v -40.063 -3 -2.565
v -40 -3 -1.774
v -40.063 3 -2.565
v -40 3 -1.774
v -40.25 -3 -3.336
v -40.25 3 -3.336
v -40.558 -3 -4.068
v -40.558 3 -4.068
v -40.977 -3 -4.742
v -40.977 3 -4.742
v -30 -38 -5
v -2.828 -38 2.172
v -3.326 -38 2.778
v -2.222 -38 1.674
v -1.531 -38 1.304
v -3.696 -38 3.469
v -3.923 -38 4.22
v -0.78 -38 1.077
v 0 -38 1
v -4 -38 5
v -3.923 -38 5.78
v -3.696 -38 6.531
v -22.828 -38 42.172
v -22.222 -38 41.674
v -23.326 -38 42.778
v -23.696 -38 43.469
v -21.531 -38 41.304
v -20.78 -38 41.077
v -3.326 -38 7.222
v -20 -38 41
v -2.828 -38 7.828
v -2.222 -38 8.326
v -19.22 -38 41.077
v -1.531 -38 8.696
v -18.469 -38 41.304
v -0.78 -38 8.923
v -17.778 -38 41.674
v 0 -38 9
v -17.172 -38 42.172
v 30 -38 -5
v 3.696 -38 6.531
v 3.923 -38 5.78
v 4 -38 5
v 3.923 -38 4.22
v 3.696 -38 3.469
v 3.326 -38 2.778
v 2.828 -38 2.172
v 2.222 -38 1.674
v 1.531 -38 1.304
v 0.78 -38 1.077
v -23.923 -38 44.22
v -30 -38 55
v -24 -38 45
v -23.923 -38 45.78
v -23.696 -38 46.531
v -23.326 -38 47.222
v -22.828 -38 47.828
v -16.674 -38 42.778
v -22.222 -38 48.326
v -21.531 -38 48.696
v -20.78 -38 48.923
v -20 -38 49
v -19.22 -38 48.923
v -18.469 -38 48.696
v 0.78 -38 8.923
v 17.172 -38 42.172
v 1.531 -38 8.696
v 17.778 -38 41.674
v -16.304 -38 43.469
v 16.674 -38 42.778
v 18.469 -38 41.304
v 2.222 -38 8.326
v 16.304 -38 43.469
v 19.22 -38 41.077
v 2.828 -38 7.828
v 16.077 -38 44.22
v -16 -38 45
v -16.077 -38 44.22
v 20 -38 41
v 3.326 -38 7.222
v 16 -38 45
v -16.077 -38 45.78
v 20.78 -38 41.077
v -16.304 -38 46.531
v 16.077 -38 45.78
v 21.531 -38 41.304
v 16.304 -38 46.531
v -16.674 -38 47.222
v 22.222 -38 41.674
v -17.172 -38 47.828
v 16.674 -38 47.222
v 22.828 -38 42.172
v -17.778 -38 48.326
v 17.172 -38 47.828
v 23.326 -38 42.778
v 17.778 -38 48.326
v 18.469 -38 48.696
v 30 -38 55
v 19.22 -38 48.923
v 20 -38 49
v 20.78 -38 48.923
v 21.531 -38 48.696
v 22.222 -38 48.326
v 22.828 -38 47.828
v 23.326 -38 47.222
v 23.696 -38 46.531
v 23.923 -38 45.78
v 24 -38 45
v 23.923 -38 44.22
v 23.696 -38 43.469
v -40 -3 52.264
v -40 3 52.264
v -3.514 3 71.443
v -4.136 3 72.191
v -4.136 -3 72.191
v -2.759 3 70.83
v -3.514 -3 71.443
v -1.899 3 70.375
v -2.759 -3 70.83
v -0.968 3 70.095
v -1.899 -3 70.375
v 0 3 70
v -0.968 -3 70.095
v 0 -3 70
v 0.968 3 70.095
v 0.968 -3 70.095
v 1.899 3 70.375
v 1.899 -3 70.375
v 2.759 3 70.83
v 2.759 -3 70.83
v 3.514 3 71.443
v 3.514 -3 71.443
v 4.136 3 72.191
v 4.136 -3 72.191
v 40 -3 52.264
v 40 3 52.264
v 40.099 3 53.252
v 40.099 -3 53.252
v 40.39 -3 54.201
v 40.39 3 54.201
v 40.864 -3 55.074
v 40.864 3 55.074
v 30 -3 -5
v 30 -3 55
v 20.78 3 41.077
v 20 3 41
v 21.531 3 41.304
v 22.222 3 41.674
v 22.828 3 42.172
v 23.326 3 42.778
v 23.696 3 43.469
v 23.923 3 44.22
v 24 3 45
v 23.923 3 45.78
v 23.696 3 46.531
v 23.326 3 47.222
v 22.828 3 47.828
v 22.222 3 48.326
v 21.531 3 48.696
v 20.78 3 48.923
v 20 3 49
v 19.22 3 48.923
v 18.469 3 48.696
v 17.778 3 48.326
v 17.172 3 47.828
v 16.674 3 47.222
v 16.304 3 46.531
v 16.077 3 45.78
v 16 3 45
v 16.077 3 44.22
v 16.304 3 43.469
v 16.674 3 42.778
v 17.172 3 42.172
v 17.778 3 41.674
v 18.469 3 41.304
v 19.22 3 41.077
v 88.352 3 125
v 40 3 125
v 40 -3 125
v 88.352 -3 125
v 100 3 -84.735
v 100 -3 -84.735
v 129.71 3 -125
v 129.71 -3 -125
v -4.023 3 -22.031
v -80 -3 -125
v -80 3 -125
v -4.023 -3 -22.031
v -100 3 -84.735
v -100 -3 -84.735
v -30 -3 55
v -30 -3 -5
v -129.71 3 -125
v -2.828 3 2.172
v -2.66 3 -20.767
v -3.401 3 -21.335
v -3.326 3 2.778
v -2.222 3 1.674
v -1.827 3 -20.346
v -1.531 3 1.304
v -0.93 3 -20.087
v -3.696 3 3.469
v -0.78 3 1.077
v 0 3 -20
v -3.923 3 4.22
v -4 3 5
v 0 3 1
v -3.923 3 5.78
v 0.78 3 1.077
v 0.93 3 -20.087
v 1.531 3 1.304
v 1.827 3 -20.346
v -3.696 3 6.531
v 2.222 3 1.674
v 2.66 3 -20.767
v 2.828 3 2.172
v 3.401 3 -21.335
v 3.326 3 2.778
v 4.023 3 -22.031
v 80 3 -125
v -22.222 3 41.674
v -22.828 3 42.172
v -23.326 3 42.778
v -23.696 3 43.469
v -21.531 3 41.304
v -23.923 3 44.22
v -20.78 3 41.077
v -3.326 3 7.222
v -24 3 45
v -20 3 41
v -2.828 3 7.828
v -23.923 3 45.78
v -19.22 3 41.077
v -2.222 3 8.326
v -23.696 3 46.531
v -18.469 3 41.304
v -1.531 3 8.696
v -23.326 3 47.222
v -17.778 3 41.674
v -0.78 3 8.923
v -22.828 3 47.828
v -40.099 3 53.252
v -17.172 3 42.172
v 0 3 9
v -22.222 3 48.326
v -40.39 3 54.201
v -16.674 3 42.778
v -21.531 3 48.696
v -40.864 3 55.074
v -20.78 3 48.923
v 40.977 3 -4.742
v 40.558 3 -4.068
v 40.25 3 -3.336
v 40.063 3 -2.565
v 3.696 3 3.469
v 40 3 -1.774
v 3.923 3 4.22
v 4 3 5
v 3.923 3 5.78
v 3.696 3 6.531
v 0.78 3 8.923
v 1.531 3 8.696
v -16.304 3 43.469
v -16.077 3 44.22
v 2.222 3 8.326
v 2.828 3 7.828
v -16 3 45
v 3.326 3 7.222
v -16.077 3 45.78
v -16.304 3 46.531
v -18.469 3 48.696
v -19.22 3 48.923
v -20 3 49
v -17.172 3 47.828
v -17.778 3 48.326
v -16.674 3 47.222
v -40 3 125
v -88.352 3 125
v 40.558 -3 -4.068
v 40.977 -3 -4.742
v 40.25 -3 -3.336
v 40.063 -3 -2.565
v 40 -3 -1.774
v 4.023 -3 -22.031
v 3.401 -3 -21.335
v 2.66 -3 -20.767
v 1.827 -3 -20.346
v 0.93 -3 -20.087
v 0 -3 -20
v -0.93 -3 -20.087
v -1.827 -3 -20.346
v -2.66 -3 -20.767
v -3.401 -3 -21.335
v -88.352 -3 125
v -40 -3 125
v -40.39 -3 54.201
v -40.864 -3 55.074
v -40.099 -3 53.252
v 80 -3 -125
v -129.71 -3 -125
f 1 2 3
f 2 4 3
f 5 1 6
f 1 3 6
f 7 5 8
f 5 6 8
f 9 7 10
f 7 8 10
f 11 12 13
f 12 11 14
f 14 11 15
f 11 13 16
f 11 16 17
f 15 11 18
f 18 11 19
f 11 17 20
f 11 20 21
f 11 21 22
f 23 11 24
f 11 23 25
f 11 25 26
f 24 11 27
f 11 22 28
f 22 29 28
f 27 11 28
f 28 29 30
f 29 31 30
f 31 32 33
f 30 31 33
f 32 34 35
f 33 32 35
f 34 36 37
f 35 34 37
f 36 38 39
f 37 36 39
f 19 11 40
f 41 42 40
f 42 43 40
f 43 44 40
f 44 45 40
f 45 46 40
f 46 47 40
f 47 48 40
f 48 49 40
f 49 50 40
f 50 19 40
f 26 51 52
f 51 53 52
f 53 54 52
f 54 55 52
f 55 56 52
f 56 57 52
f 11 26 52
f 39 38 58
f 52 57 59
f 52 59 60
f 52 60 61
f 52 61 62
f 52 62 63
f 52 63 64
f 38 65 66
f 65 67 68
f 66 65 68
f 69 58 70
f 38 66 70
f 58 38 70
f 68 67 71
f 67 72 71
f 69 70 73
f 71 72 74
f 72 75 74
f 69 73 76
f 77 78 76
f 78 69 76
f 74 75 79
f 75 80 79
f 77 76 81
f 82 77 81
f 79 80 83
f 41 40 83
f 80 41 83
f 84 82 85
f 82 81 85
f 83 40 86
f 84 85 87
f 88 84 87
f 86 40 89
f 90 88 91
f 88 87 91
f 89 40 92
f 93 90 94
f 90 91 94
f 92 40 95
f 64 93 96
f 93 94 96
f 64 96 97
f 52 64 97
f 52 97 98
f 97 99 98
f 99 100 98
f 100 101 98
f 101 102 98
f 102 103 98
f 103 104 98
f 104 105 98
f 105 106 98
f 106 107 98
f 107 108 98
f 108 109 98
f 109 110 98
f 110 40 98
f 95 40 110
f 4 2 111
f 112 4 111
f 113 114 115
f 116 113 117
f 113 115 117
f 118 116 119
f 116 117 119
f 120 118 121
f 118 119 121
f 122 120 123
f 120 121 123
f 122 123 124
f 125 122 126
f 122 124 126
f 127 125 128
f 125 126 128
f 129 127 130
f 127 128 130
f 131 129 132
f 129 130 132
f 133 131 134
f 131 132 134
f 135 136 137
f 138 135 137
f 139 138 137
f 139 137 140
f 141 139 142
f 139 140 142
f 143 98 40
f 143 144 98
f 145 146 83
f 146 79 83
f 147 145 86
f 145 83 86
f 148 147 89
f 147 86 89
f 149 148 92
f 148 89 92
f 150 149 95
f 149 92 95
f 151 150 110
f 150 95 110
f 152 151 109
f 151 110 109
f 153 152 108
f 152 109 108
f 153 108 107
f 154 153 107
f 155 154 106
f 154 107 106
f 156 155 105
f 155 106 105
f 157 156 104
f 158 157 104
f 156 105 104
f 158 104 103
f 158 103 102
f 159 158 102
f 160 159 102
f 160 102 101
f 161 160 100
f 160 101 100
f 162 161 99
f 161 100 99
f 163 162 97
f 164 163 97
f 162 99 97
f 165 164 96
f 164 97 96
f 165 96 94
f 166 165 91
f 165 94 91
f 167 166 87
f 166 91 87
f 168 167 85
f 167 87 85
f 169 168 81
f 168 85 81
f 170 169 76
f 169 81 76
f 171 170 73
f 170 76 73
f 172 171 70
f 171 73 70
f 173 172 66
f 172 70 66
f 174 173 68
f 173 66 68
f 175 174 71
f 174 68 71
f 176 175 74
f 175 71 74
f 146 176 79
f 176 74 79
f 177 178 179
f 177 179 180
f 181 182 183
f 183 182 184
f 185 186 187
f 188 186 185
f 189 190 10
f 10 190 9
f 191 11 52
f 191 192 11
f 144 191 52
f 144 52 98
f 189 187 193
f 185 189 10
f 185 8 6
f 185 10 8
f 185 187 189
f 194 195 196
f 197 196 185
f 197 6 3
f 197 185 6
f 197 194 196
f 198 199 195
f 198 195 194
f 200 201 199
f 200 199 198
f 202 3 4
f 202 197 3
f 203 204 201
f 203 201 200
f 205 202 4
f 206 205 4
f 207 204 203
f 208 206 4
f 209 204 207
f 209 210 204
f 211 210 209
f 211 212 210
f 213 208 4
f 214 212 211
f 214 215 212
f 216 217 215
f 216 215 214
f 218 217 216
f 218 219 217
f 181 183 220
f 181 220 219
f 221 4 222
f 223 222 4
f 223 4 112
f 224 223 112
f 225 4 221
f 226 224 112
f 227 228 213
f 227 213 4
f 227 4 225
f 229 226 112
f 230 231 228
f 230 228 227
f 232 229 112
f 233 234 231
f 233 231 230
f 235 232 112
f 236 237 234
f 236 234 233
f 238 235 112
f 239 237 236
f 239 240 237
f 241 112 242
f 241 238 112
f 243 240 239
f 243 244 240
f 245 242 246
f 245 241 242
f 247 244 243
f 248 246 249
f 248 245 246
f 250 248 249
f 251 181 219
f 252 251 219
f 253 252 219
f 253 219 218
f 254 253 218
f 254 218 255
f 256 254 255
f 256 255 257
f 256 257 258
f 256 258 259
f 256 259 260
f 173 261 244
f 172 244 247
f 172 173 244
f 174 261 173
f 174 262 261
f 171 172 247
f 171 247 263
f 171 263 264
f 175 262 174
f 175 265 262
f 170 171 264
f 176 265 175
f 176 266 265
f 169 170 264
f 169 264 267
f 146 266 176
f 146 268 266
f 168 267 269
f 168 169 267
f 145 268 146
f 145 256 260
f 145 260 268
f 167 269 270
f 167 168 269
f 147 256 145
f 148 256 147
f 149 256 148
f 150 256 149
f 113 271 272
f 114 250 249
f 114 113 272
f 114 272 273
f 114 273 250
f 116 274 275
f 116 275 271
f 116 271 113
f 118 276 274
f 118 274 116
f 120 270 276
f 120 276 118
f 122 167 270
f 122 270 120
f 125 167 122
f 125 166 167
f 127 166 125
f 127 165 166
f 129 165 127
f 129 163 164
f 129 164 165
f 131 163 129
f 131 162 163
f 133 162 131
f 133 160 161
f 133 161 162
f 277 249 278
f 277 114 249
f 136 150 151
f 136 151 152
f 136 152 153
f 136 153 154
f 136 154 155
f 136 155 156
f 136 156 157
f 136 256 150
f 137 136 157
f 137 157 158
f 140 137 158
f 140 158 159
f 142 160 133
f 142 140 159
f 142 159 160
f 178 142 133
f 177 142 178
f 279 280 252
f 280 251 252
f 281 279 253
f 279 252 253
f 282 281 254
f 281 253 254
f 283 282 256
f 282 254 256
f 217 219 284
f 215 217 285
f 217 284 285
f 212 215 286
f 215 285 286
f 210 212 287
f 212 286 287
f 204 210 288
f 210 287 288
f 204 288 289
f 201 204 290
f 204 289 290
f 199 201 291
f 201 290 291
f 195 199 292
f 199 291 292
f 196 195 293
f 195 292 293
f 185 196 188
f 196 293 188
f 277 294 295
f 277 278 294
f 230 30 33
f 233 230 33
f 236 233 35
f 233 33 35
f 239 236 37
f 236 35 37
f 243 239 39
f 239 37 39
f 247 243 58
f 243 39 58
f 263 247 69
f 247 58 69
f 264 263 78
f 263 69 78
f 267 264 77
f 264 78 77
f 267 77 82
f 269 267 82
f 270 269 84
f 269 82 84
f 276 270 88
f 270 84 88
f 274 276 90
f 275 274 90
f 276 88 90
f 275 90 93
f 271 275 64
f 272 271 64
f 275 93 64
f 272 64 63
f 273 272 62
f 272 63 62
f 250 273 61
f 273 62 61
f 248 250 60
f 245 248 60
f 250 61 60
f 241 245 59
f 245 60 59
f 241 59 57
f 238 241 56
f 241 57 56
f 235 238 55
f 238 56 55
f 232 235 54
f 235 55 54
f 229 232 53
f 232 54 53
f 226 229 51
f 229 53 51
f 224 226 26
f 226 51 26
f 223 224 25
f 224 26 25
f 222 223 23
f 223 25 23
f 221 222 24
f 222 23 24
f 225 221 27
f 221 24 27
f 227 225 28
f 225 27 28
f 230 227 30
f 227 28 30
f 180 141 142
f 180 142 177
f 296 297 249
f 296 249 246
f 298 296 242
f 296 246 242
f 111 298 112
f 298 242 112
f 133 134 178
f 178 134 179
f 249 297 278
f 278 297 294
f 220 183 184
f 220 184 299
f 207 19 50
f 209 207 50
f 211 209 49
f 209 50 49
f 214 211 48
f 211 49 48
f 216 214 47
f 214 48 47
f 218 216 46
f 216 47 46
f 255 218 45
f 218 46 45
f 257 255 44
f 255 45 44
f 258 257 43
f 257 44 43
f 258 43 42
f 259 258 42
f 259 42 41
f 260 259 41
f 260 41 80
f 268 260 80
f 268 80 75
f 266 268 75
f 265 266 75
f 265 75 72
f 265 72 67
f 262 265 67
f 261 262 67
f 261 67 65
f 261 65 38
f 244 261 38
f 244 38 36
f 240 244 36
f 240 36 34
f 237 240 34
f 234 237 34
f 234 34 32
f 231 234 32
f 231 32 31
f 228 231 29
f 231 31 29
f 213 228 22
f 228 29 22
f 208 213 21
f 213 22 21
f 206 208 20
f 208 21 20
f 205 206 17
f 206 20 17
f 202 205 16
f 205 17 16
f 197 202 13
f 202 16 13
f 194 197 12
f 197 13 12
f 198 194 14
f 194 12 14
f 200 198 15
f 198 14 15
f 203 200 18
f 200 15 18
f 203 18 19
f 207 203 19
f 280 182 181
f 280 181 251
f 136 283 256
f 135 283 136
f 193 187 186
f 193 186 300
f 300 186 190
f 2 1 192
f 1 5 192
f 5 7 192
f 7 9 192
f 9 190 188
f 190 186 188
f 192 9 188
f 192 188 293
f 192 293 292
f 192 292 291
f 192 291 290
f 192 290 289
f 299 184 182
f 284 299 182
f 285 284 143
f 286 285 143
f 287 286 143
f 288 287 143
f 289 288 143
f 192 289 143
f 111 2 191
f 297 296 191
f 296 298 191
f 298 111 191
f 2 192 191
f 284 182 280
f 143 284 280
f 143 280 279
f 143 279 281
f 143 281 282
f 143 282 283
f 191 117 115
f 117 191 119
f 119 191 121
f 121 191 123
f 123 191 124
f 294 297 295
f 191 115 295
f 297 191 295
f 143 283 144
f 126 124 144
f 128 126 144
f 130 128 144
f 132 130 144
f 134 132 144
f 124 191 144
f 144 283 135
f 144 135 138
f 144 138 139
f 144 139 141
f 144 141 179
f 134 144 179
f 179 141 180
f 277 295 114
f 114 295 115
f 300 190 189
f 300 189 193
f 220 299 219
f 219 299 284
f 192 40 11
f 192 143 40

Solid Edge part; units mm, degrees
sketch "Sketch1" plane through (0, 0, 0) normal (0, -1, 0) x (1, 0, 0)
  line L0 (-100, 125) -> (100, 125)
  line L1 (100, 125) -> (100, -125)
  line L2 (100, -125) -> (-100, -125)
  line L3 (-100, -125) -> (-100, 125)
  dimension "D1" = 250
  dimension "D2" = 200
extrude "Protrusion1" add sketch "Sketch1" along normal mid plane 6
sketch "Sketch2" plane through (0, -3, 0) normal (0, -1, 0) x (1, 0, 0)
  line L0 (-30, 55) -> (30, 55)
  line L1 (30, 55) -> (30, -5)
  line L2 (30, -5) -> (-30, -5)
  line L3 (-30, -5) -> (-30, 55)
  dimension "D1" = 60
  dimension "D2" = 60
  dimension "D3" = 120
  dimension "D4" = 70
extrude "Ausprägung_2" add sketch "Sketch2" along normal blind 35
hole "Bohrung_4" at (20, -38, 45) direction (0, 1, 0) diameter 8 end up to next
hole "Hole1" at (0, -38, 5) direction (0, 1, 0) diameter 8 end up to next
hole "Hole2" at (-20, -38, 45) direction (0, 1, 0) diameter 8 end up to next
sketch "Sketch3" plane through (0, -3, 0) normal (0, -1, 0) x (1, 0, 0)
  circle A0 centre (0, -25) radius 5
  dimension "D1" = 10
  dimension "D2" = 100
extrude "Ausschnitt_1" cut sketch "Sketch3" against normal blind 469.9
sketch "Sketch4" plane through (0, -3, 0) normal (0, -1, 0) x (1, 0, 0)
  line L0 (-4.0233, -22.0313) -> (4.0233, -22.0313)
  line L1 (-80, -125) -> (-4.0233, -22.0313)
  line L2 (-80, -125) -> (80, -125)
  line L3 (80, -125) -> (4.0233, -22.0313)
  dimension "D1" = 160
  dimension "D2" = 20
extrude "Ausschnitt_3" cut sketch "Sketch4" against normal blind 320.675
sketch "Sketch5" plane through (0, -3, 0) normal (0, -1, 0) x (1, 0, 0)
  circle A0 centre (0, 75) radius 5
  dimension "D1" = 10
  dimension "D2" = 20
extrude "Ausschnitt_4" cut sketch "Sketch5" against normal blind 250.825
sketch "Sketch6" plane through (0, -3, 0) normal (0, -1, 0) x (1, 0, 0)
  line L0 (-40, 125) -> (-4.1363, 72.1909)
  line L1 (-4.1363, 72.1909) -> (4.1363, 72.1909)
  line L2 (4.1363, 72.1909) -> (40, 125)
  line L3 (40, 125) -> (-40, 125)
  dimension "D1" = 80
  dimension "D2" = 60
extrude "Ausschnitt_5" cut sketch "Sketch6" against normal blind 673.1
sketch "Sketch7" plane through (0, -3, 0) normal (0, -1, 0) x (0.5937309, 0, 0.8046637)
  line L0 (-127.5561, 30.1567) -> (-26.5002, 30.1567)
  line L1 (-26.5002, 30.1567) -> (19.5431, 64.1303)
  line L2 (19.5431, 64.1303) -> (48.1256, 145.3101)
  line L3 (48.1256, 145.3101) -> (48.1256, 179.0397)
  line L4 (48.1256, 179.0397) -> (-141.6388, 49.5277)
  line L5 (-141.6388, 49.5277) -> (-127.5561, 30.1567)
  dimension "D1" = 127.5561
extrude "Ausschnitt_6" cut sketch "Sketch7" against normal blind 1343.025
sketch "Sketch8" plane through (0, -3, 0) normal (0, -1, 0) x (0.5937309, 0, 0.8046637)
  line L0 (-8.8099, -130.776) -> (20.9983, -34.2164)
  line L1 (20.9983, -34.2164) -> (67.0416, -0.2428)
  line L2 (67.0416, -0.2428) -> (153.0403, 3.1226)
  line L3 (153.0403, 3.1226) -> (159.956, -6.25)
  line L4 (159.956, -6.25) -> (-8.8099, -130.776)
extrude "Ausschnitt_8" cut sketch "Sketch8" against normal blind 660.4
sketch "Sketch9" plane through (100, 0, -104.8674) normal (1, 0, 0) x (0, 0, -1)
  line L0 (-20.1326, 3) -> (20.1326, 3)
  line L1 (20.1326, 3) -> (20.1326, -3)
  line L2 (20.1326, -3) -> (-20.1326, -3)
  line L3 (-20.1326, -3) -> (-20.1326, 3)
  dimension "D1" = 40.2653
  dimension "D2" = 6
extrude "Ausprägung_4" add sketch "Sketch9" along normal blind 35
sketch "Sketch10" plane through (17.5, -3, 0) normal (0, -1, 0) x (-0.5937309, 0, -0.8046637)
  line L0 (19.2002, 116.6944) -> (33.9603, 164.5078)
  line L1 (33.9603, 164.5078) -> (30.8196, 168.7643)
  line L2 (30.8196, 168.7643) -> (-1.5804, 144.8576)
  line L3 (-1.5804, 144.8576) -> (19.2002, 116.6944)
extrude "Ausschnitt_9" cut sketch "Sketch10" against normal blind 101.6
sketch "Sketch11" plane through (-100, 0, -104.8674) normal (-1, 0, 0) x (0, 0, -1)
  line L0 (-20.1326, 3) -> (20.1326, 3)
  line L1 (20.1326, 3) -> (20.1326, -3)
  line L2 (20.1326, -3) -> (-20.1326, -3)
  line L3 (-20.1326, -3) -> (-20.1326, 3)
extrude "Ausprägung_5" add sketch "Sketch11" along normal blind 35
sketch "Sketch12" plane through (-2.6449, -3, 0) normal (0, -1, 0) x (-0.5937309, 0, -0.8046637)
  line L0 (125.9857, -28.0285) -> (176.0256, -28.0285)
  line L1 (176.0256, -28.0285) -> (179.1663, -32.285)
  line L2 (179.1663, -32.285) -> (146.7663, -56.1917)
  line L3 (146.7663, -56.1917) -> (125.9857, -28.0285)
extrude "Ausschnitt_10" cut sketch "Sketch12" against normal blind 34.925
fillet "Verrundung_4" radius 5 4 edges at (40, 0, -3.4188) (40, 0, 53.8018) (-40, 0, -3.4188) (-40, 0, 53.8018)
properties material "Aluminium, 1060"
